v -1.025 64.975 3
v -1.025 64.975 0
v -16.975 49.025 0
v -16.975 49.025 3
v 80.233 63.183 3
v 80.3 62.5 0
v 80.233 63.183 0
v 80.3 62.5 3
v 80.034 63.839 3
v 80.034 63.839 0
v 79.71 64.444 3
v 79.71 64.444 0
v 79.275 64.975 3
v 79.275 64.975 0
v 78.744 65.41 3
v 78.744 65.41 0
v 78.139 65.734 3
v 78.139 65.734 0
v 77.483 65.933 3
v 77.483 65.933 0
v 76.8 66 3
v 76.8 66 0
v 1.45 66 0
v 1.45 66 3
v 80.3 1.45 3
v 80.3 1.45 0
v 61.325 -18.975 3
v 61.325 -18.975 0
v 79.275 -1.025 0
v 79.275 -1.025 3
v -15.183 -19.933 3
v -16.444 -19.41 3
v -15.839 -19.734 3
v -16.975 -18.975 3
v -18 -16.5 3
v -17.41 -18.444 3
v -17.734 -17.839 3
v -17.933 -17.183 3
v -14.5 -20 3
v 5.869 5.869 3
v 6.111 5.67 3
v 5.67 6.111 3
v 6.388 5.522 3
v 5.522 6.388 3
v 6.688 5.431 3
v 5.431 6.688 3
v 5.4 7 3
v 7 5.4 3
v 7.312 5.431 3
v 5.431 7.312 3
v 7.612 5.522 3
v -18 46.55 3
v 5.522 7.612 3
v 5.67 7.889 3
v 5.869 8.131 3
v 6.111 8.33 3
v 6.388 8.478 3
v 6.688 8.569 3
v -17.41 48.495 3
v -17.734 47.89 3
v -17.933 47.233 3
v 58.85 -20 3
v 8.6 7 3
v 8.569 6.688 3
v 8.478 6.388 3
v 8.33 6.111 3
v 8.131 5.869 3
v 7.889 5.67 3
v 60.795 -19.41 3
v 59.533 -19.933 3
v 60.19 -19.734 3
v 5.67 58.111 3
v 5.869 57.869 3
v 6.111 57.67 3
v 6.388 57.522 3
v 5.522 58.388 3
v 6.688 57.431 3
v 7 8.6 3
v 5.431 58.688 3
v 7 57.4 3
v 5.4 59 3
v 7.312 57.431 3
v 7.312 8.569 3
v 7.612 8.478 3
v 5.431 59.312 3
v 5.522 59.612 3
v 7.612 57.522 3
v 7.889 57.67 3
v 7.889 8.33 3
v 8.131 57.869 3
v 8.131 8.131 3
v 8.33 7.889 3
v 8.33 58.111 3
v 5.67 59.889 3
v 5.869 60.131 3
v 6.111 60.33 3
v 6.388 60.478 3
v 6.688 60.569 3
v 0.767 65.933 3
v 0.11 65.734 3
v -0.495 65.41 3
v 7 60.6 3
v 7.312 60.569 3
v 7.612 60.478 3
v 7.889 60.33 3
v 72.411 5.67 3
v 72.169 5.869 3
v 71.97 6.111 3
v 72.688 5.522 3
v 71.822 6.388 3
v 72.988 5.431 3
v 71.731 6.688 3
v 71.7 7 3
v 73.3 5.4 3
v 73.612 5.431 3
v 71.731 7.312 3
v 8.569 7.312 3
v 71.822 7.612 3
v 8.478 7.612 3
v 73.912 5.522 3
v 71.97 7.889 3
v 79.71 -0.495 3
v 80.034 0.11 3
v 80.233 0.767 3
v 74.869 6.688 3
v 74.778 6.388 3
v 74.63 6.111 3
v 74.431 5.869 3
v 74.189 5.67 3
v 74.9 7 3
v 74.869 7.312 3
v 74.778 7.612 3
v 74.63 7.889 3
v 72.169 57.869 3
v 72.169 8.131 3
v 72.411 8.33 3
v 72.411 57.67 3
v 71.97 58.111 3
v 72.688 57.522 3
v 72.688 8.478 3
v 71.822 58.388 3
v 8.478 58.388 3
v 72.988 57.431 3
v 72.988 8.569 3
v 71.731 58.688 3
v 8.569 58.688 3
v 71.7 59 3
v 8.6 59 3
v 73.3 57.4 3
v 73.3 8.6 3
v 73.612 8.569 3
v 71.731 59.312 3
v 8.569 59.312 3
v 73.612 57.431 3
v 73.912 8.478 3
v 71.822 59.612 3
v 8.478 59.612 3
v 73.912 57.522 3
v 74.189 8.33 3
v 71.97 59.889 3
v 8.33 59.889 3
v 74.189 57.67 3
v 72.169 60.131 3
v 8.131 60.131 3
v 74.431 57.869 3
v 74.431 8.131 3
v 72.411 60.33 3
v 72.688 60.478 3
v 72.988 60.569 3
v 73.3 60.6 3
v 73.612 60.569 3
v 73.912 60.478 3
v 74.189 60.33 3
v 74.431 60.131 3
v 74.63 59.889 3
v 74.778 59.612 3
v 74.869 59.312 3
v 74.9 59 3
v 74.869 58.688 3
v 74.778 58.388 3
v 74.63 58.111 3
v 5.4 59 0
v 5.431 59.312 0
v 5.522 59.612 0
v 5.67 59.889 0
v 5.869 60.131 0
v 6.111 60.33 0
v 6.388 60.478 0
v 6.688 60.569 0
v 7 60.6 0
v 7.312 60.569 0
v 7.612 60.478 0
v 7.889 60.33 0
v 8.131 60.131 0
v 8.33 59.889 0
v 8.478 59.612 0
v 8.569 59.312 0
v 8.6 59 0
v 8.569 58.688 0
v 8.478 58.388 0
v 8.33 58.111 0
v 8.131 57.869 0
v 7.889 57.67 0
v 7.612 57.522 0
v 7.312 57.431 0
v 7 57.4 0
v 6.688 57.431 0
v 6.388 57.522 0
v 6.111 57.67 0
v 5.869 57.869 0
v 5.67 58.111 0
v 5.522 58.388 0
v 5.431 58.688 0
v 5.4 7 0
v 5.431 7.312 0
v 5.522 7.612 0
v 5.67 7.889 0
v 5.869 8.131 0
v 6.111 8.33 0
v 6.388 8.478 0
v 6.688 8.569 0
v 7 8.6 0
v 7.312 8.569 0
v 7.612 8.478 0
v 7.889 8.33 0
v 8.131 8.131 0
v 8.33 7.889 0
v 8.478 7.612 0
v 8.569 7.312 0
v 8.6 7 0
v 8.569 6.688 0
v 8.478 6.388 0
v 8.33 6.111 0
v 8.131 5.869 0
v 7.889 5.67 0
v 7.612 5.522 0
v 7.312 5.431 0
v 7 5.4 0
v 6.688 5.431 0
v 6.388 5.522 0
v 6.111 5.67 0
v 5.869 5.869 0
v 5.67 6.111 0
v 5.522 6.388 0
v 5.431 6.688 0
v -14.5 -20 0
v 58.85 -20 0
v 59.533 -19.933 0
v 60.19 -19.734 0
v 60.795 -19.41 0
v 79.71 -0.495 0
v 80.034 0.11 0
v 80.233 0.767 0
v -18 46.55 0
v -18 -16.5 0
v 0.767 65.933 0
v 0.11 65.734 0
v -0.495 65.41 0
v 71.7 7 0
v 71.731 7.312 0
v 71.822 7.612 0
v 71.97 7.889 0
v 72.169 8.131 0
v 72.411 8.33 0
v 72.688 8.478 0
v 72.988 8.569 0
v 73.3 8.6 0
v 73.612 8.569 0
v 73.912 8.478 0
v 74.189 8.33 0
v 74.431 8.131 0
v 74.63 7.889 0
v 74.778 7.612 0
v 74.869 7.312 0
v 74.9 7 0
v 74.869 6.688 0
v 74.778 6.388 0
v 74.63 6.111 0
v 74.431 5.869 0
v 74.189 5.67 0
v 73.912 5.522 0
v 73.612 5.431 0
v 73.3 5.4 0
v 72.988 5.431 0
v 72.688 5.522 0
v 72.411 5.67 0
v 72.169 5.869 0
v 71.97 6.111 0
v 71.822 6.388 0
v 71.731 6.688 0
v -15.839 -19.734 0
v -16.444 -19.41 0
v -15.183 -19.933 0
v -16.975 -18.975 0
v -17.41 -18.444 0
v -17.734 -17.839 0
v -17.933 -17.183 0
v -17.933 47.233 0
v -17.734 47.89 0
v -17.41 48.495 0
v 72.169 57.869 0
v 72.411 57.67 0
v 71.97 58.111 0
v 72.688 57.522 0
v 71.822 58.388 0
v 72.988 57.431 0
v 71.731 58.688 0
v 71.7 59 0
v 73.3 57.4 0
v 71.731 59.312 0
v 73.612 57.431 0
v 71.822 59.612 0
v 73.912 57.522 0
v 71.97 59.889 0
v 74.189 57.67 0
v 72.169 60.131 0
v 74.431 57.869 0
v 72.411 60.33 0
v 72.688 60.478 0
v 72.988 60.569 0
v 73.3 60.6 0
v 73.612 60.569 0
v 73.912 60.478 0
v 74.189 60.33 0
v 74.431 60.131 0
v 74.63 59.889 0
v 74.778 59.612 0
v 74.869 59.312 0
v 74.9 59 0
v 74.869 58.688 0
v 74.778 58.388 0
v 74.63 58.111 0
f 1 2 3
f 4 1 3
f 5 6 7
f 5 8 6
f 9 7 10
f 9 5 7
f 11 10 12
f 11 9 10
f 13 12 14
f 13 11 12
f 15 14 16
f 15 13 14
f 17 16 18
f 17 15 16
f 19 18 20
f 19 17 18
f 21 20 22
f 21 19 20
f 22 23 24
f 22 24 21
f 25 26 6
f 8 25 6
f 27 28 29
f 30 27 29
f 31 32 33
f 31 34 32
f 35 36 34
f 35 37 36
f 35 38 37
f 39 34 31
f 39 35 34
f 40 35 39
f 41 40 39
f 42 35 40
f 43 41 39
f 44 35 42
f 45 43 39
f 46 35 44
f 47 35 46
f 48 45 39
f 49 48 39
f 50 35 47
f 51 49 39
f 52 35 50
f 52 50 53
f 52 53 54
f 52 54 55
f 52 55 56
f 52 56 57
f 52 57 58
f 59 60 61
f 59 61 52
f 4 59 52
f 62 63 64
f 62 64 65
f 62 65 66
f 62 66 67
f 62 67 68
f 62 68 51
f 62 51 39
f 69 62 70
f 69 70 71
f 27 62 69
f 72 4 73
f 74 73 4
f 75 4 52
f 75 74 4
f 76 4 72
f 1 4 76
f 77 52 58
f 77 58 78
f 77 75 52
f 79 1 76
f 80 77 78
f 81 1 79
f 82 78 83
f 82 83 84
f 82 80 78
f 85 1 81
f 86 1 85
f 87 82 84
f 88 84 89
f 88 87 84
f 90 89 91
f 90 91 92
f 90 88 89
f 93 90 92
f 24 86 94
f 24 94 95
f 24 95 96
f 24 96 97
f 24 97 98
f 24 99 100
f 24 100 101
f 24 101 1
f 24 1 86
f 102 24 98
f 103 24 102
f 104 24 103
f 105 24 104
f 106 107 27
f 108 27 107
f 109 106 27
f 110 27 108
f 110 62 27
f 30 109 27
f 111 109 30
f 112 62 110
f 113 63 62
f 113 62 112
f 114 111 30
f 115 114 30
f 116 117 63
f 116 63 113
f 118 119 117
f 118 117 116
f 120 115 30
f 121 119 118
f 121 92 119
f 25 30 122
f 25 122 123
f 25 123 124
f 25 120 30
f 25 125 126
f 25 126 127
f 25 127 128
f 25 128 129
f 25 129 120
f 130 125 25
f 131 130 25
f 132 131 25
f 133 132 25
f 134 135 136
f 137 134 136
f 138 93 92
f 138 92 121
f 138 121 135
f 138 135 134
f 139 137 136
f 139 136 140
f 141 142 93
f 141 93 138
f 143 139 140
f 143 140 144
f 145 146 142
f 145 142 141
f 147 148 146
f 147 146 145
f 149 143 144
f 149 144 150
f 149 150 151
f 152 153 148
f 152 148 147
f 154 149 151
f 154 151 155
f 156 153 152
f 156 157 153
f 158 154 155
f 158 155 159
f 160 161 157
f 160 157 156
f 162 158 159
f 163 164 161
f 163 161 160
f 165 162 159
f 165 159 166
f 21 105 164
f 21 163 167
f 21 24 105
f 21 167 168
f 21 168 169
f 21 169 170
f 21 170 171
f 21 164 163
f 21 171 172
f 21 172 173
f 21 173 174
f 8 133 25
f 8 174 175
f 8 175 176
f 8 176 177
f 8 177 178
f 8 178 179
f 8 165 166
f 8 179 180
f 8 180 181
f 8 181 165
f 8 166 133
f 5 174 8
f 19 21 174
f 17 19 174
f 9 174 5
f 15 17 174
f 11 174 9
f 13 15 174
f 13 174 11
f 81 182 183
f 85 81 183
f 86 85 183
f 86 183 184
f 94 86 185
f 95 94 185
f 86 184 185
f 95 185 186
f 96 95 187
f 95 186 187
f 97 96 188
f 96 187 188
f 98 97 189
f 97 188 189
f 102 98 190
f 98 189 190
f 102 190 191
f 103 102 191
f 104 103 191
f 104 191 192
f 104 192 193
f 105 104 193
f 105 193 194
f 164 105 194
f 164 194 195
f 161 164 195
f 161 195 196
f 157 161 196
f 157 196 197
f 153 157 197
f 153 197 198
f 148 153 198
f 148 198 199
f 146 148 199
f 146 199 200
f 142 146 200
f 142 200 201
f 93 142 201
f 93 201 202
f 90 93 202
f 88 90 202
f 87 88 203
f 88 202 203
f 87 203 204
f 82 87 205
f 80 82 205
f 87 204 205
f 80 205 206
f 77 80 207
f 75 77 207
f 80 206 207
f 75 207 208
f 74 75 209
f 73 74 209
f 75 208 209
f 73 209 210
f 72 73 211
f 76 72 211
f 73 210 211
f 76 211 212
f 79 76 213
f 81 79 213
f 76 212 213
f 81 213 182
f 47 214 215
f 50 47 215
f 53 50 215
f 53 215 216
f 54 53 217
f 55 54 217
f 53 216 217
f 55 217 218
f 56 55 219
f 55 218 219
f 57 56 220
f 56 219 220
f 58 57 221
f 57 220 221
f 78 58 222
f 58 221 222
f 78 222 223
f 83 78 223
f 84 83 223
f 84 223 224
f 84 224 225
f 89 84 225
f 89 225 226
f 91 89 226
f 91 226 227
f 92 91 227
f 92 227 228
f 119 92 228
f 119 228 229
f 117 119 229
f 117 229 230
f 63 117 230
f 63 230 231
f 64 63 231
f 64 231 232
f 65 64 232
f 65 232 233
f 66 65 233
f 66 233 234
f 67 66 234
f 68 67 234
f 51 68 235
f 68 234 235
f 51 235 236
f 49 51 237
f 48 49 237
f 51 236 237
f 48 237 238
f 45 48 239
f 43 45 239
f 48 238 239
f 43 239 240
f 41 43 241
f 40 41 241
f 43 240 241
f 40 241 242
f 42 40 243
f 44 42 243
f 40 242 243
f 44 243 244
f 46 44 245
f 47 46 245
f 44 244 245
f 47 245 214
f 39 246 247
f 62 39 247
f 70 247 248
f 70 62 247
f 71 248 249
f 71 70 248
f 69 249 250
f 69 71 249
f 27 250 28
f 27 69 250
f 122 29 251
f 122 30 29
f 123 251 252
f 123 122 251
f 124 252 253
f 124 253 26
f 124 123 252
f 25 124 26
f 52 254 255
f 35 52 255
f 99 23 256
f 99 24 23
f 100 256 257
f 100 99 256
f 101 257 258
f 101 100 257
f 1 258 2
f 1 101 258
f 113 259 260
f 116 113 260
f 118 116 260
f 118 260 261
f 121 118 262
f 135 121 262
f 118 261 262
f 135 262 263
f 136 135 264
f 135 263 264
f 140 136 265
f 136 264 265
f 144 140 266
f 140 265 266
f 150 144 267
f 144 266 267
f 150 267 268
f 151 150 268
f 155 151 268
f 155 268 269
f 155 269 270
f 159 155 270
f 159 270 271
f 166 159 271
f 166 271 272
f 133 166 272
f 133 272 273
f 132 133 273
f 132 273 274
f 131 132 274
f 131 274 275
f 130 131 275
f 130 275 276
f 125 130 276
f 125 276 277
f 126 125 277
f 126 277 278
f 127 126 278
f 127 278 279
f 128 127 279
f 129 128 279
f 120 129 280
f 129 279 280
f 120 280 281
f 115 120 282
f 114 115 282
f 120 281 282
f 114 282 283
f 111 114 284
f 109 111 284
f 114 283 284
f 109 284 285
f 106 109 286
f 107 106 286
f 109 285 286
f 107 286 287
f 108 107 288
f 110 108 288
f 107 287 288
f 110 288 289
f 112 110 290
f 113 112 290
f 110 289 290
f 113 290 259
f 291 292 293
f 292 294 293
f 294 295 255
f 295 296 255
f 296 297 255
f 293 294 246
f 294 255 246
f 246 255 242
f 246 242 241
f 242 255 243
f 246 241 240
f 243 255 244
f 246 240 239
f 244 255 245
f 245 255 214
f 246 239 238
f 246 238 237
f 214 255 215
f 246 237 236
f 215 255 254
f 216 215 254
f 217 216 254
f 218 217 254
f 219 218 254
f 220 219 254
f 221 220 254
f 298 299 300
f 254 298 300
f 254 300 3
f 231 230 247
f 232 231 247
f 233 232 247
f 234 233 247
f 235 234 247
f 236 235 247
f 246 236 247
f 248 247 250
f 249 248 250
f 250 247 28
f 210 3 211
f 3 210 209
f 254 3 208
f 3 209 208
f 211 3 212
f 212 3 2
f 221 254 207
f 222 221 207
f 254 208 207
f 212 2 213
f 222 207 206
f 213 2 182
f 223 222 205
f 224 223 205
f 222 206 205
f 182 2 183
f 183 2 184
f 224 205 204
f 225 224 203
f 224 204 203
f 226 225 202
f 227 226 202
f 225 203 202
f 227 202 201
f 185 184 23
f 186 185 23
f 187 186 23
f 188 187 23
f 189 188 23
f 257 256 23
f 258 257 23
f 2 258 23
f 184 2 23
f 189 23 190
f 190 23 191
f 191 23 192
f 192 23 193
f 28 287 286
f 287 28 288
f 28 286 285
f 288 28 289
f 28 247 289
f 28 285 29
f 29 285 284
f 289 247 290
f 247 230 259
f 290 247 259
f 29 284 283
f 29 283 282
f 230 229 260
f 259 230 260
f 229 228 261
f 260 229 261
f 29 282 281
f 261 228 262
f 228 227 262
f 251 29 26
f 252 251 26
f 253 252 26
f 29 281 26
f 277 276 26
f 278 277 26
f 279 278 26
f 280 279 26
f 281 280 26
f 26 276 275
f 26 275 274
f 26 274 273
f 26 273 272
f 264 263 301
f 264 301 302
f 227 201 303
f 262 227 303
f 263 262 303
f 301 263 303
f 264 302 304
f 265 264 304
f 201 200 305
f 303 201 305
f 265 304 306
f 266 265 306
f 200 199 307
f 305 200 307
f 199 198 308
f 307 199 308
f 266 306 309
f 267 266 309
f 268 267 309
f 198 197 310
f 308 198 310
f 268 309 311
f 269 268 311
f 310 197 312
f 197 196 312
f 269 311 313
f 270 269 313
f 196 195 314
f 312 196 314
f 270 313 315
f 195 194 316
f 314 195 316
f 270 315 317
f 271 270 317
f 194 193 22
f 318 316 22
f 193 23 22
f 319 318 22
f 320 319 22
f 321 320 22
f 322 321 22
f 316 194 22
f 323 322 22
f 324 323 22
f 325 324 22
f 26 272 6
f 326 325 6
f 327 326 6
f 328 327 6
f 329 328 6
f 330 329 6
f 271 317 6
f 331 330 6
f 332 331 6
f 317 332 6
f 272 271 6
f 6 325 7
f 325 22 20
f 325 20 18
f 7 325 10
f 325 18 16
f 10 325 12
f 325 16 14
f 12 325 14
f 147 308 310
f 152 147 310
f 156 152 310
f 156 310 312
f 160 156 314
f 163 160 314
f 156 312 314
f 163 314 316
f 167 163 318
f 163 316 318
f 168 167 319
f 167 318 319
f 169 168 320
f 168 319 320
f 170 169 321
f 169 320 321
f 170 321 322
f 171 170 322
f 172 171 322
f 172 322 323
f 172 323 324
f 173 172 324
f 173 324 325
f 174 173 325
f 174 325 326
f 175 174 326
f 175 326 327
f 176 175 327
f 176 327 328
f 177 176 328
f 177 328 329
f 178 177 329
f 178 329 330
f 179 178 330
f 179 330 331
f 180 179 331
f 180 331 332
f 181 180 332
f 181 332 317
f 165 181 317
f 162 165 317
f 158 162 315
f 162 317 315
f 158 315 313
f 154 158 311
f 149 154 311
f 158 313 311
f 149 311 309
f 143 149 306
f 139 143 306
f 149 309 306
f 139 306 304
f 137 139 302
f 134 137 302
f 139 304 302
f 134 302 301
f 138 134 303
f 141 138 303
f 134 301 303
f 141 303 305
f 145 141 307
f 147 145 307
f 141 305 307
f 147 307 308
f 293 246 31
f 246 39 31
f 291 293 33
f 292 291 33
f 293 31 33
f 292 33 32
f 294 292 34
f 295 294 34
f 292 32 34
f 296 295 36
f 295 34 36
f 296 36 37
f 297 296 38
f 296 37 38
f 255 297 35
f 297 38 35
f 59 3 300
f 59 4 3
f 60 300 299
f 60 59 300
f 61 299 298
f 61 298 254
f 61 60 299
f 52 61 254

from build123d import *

# Parameters (mm, degrees)
SKETCH1_W                  = 80.3
SKETCH1_H                  = 66
BOSS_EXTRUDE1_DEPTH        = 3
FILLET1_R                  = 3.5
F_3_2_3_2_DIAMETER_HOLE1_D = 3.2


with BuildPart() as part:
    # Sketch1 → Boss-Extrude1 (new body)
    with BuildSketch(Plane.XY):
        Polygon((-18, -20), (60.3, -20), (80.3, 0), (0, 0), (0, 66), (-18, 48), align=None)
        with Locations((40.15, 33)):
            Rectangle(SKETCH1_W, SKETCH1_H)
    extrude(amount=BOSS_EXTRUDE1_DEPTH)

    # Fillet1
    fillet1_edges = [part.edges().sort_by_distance(p)[0] for p in [
        (60.3, -20, 1.5),
        (-18, -20, 1.5),
        (-18, 48, 1.5),
        (0, 66, 1.5),
        (80.3, 66, 1.5),
        (80.3, 0, 1.5),
    ]]
    fillet(fillet1_edges, radius=FILLET1_R)

    # Ø3.2 (3.2) Diameter Hole1 (through all)
    with Locations(Plane.XY.offset(3)):
        with Locations((7, 59), (73.3, 59), (73.3, 7), (7, 7)):
            Hole(F_3_2_3_2_DIAMETER_HOLE1_D / 2)


solid = part.part
